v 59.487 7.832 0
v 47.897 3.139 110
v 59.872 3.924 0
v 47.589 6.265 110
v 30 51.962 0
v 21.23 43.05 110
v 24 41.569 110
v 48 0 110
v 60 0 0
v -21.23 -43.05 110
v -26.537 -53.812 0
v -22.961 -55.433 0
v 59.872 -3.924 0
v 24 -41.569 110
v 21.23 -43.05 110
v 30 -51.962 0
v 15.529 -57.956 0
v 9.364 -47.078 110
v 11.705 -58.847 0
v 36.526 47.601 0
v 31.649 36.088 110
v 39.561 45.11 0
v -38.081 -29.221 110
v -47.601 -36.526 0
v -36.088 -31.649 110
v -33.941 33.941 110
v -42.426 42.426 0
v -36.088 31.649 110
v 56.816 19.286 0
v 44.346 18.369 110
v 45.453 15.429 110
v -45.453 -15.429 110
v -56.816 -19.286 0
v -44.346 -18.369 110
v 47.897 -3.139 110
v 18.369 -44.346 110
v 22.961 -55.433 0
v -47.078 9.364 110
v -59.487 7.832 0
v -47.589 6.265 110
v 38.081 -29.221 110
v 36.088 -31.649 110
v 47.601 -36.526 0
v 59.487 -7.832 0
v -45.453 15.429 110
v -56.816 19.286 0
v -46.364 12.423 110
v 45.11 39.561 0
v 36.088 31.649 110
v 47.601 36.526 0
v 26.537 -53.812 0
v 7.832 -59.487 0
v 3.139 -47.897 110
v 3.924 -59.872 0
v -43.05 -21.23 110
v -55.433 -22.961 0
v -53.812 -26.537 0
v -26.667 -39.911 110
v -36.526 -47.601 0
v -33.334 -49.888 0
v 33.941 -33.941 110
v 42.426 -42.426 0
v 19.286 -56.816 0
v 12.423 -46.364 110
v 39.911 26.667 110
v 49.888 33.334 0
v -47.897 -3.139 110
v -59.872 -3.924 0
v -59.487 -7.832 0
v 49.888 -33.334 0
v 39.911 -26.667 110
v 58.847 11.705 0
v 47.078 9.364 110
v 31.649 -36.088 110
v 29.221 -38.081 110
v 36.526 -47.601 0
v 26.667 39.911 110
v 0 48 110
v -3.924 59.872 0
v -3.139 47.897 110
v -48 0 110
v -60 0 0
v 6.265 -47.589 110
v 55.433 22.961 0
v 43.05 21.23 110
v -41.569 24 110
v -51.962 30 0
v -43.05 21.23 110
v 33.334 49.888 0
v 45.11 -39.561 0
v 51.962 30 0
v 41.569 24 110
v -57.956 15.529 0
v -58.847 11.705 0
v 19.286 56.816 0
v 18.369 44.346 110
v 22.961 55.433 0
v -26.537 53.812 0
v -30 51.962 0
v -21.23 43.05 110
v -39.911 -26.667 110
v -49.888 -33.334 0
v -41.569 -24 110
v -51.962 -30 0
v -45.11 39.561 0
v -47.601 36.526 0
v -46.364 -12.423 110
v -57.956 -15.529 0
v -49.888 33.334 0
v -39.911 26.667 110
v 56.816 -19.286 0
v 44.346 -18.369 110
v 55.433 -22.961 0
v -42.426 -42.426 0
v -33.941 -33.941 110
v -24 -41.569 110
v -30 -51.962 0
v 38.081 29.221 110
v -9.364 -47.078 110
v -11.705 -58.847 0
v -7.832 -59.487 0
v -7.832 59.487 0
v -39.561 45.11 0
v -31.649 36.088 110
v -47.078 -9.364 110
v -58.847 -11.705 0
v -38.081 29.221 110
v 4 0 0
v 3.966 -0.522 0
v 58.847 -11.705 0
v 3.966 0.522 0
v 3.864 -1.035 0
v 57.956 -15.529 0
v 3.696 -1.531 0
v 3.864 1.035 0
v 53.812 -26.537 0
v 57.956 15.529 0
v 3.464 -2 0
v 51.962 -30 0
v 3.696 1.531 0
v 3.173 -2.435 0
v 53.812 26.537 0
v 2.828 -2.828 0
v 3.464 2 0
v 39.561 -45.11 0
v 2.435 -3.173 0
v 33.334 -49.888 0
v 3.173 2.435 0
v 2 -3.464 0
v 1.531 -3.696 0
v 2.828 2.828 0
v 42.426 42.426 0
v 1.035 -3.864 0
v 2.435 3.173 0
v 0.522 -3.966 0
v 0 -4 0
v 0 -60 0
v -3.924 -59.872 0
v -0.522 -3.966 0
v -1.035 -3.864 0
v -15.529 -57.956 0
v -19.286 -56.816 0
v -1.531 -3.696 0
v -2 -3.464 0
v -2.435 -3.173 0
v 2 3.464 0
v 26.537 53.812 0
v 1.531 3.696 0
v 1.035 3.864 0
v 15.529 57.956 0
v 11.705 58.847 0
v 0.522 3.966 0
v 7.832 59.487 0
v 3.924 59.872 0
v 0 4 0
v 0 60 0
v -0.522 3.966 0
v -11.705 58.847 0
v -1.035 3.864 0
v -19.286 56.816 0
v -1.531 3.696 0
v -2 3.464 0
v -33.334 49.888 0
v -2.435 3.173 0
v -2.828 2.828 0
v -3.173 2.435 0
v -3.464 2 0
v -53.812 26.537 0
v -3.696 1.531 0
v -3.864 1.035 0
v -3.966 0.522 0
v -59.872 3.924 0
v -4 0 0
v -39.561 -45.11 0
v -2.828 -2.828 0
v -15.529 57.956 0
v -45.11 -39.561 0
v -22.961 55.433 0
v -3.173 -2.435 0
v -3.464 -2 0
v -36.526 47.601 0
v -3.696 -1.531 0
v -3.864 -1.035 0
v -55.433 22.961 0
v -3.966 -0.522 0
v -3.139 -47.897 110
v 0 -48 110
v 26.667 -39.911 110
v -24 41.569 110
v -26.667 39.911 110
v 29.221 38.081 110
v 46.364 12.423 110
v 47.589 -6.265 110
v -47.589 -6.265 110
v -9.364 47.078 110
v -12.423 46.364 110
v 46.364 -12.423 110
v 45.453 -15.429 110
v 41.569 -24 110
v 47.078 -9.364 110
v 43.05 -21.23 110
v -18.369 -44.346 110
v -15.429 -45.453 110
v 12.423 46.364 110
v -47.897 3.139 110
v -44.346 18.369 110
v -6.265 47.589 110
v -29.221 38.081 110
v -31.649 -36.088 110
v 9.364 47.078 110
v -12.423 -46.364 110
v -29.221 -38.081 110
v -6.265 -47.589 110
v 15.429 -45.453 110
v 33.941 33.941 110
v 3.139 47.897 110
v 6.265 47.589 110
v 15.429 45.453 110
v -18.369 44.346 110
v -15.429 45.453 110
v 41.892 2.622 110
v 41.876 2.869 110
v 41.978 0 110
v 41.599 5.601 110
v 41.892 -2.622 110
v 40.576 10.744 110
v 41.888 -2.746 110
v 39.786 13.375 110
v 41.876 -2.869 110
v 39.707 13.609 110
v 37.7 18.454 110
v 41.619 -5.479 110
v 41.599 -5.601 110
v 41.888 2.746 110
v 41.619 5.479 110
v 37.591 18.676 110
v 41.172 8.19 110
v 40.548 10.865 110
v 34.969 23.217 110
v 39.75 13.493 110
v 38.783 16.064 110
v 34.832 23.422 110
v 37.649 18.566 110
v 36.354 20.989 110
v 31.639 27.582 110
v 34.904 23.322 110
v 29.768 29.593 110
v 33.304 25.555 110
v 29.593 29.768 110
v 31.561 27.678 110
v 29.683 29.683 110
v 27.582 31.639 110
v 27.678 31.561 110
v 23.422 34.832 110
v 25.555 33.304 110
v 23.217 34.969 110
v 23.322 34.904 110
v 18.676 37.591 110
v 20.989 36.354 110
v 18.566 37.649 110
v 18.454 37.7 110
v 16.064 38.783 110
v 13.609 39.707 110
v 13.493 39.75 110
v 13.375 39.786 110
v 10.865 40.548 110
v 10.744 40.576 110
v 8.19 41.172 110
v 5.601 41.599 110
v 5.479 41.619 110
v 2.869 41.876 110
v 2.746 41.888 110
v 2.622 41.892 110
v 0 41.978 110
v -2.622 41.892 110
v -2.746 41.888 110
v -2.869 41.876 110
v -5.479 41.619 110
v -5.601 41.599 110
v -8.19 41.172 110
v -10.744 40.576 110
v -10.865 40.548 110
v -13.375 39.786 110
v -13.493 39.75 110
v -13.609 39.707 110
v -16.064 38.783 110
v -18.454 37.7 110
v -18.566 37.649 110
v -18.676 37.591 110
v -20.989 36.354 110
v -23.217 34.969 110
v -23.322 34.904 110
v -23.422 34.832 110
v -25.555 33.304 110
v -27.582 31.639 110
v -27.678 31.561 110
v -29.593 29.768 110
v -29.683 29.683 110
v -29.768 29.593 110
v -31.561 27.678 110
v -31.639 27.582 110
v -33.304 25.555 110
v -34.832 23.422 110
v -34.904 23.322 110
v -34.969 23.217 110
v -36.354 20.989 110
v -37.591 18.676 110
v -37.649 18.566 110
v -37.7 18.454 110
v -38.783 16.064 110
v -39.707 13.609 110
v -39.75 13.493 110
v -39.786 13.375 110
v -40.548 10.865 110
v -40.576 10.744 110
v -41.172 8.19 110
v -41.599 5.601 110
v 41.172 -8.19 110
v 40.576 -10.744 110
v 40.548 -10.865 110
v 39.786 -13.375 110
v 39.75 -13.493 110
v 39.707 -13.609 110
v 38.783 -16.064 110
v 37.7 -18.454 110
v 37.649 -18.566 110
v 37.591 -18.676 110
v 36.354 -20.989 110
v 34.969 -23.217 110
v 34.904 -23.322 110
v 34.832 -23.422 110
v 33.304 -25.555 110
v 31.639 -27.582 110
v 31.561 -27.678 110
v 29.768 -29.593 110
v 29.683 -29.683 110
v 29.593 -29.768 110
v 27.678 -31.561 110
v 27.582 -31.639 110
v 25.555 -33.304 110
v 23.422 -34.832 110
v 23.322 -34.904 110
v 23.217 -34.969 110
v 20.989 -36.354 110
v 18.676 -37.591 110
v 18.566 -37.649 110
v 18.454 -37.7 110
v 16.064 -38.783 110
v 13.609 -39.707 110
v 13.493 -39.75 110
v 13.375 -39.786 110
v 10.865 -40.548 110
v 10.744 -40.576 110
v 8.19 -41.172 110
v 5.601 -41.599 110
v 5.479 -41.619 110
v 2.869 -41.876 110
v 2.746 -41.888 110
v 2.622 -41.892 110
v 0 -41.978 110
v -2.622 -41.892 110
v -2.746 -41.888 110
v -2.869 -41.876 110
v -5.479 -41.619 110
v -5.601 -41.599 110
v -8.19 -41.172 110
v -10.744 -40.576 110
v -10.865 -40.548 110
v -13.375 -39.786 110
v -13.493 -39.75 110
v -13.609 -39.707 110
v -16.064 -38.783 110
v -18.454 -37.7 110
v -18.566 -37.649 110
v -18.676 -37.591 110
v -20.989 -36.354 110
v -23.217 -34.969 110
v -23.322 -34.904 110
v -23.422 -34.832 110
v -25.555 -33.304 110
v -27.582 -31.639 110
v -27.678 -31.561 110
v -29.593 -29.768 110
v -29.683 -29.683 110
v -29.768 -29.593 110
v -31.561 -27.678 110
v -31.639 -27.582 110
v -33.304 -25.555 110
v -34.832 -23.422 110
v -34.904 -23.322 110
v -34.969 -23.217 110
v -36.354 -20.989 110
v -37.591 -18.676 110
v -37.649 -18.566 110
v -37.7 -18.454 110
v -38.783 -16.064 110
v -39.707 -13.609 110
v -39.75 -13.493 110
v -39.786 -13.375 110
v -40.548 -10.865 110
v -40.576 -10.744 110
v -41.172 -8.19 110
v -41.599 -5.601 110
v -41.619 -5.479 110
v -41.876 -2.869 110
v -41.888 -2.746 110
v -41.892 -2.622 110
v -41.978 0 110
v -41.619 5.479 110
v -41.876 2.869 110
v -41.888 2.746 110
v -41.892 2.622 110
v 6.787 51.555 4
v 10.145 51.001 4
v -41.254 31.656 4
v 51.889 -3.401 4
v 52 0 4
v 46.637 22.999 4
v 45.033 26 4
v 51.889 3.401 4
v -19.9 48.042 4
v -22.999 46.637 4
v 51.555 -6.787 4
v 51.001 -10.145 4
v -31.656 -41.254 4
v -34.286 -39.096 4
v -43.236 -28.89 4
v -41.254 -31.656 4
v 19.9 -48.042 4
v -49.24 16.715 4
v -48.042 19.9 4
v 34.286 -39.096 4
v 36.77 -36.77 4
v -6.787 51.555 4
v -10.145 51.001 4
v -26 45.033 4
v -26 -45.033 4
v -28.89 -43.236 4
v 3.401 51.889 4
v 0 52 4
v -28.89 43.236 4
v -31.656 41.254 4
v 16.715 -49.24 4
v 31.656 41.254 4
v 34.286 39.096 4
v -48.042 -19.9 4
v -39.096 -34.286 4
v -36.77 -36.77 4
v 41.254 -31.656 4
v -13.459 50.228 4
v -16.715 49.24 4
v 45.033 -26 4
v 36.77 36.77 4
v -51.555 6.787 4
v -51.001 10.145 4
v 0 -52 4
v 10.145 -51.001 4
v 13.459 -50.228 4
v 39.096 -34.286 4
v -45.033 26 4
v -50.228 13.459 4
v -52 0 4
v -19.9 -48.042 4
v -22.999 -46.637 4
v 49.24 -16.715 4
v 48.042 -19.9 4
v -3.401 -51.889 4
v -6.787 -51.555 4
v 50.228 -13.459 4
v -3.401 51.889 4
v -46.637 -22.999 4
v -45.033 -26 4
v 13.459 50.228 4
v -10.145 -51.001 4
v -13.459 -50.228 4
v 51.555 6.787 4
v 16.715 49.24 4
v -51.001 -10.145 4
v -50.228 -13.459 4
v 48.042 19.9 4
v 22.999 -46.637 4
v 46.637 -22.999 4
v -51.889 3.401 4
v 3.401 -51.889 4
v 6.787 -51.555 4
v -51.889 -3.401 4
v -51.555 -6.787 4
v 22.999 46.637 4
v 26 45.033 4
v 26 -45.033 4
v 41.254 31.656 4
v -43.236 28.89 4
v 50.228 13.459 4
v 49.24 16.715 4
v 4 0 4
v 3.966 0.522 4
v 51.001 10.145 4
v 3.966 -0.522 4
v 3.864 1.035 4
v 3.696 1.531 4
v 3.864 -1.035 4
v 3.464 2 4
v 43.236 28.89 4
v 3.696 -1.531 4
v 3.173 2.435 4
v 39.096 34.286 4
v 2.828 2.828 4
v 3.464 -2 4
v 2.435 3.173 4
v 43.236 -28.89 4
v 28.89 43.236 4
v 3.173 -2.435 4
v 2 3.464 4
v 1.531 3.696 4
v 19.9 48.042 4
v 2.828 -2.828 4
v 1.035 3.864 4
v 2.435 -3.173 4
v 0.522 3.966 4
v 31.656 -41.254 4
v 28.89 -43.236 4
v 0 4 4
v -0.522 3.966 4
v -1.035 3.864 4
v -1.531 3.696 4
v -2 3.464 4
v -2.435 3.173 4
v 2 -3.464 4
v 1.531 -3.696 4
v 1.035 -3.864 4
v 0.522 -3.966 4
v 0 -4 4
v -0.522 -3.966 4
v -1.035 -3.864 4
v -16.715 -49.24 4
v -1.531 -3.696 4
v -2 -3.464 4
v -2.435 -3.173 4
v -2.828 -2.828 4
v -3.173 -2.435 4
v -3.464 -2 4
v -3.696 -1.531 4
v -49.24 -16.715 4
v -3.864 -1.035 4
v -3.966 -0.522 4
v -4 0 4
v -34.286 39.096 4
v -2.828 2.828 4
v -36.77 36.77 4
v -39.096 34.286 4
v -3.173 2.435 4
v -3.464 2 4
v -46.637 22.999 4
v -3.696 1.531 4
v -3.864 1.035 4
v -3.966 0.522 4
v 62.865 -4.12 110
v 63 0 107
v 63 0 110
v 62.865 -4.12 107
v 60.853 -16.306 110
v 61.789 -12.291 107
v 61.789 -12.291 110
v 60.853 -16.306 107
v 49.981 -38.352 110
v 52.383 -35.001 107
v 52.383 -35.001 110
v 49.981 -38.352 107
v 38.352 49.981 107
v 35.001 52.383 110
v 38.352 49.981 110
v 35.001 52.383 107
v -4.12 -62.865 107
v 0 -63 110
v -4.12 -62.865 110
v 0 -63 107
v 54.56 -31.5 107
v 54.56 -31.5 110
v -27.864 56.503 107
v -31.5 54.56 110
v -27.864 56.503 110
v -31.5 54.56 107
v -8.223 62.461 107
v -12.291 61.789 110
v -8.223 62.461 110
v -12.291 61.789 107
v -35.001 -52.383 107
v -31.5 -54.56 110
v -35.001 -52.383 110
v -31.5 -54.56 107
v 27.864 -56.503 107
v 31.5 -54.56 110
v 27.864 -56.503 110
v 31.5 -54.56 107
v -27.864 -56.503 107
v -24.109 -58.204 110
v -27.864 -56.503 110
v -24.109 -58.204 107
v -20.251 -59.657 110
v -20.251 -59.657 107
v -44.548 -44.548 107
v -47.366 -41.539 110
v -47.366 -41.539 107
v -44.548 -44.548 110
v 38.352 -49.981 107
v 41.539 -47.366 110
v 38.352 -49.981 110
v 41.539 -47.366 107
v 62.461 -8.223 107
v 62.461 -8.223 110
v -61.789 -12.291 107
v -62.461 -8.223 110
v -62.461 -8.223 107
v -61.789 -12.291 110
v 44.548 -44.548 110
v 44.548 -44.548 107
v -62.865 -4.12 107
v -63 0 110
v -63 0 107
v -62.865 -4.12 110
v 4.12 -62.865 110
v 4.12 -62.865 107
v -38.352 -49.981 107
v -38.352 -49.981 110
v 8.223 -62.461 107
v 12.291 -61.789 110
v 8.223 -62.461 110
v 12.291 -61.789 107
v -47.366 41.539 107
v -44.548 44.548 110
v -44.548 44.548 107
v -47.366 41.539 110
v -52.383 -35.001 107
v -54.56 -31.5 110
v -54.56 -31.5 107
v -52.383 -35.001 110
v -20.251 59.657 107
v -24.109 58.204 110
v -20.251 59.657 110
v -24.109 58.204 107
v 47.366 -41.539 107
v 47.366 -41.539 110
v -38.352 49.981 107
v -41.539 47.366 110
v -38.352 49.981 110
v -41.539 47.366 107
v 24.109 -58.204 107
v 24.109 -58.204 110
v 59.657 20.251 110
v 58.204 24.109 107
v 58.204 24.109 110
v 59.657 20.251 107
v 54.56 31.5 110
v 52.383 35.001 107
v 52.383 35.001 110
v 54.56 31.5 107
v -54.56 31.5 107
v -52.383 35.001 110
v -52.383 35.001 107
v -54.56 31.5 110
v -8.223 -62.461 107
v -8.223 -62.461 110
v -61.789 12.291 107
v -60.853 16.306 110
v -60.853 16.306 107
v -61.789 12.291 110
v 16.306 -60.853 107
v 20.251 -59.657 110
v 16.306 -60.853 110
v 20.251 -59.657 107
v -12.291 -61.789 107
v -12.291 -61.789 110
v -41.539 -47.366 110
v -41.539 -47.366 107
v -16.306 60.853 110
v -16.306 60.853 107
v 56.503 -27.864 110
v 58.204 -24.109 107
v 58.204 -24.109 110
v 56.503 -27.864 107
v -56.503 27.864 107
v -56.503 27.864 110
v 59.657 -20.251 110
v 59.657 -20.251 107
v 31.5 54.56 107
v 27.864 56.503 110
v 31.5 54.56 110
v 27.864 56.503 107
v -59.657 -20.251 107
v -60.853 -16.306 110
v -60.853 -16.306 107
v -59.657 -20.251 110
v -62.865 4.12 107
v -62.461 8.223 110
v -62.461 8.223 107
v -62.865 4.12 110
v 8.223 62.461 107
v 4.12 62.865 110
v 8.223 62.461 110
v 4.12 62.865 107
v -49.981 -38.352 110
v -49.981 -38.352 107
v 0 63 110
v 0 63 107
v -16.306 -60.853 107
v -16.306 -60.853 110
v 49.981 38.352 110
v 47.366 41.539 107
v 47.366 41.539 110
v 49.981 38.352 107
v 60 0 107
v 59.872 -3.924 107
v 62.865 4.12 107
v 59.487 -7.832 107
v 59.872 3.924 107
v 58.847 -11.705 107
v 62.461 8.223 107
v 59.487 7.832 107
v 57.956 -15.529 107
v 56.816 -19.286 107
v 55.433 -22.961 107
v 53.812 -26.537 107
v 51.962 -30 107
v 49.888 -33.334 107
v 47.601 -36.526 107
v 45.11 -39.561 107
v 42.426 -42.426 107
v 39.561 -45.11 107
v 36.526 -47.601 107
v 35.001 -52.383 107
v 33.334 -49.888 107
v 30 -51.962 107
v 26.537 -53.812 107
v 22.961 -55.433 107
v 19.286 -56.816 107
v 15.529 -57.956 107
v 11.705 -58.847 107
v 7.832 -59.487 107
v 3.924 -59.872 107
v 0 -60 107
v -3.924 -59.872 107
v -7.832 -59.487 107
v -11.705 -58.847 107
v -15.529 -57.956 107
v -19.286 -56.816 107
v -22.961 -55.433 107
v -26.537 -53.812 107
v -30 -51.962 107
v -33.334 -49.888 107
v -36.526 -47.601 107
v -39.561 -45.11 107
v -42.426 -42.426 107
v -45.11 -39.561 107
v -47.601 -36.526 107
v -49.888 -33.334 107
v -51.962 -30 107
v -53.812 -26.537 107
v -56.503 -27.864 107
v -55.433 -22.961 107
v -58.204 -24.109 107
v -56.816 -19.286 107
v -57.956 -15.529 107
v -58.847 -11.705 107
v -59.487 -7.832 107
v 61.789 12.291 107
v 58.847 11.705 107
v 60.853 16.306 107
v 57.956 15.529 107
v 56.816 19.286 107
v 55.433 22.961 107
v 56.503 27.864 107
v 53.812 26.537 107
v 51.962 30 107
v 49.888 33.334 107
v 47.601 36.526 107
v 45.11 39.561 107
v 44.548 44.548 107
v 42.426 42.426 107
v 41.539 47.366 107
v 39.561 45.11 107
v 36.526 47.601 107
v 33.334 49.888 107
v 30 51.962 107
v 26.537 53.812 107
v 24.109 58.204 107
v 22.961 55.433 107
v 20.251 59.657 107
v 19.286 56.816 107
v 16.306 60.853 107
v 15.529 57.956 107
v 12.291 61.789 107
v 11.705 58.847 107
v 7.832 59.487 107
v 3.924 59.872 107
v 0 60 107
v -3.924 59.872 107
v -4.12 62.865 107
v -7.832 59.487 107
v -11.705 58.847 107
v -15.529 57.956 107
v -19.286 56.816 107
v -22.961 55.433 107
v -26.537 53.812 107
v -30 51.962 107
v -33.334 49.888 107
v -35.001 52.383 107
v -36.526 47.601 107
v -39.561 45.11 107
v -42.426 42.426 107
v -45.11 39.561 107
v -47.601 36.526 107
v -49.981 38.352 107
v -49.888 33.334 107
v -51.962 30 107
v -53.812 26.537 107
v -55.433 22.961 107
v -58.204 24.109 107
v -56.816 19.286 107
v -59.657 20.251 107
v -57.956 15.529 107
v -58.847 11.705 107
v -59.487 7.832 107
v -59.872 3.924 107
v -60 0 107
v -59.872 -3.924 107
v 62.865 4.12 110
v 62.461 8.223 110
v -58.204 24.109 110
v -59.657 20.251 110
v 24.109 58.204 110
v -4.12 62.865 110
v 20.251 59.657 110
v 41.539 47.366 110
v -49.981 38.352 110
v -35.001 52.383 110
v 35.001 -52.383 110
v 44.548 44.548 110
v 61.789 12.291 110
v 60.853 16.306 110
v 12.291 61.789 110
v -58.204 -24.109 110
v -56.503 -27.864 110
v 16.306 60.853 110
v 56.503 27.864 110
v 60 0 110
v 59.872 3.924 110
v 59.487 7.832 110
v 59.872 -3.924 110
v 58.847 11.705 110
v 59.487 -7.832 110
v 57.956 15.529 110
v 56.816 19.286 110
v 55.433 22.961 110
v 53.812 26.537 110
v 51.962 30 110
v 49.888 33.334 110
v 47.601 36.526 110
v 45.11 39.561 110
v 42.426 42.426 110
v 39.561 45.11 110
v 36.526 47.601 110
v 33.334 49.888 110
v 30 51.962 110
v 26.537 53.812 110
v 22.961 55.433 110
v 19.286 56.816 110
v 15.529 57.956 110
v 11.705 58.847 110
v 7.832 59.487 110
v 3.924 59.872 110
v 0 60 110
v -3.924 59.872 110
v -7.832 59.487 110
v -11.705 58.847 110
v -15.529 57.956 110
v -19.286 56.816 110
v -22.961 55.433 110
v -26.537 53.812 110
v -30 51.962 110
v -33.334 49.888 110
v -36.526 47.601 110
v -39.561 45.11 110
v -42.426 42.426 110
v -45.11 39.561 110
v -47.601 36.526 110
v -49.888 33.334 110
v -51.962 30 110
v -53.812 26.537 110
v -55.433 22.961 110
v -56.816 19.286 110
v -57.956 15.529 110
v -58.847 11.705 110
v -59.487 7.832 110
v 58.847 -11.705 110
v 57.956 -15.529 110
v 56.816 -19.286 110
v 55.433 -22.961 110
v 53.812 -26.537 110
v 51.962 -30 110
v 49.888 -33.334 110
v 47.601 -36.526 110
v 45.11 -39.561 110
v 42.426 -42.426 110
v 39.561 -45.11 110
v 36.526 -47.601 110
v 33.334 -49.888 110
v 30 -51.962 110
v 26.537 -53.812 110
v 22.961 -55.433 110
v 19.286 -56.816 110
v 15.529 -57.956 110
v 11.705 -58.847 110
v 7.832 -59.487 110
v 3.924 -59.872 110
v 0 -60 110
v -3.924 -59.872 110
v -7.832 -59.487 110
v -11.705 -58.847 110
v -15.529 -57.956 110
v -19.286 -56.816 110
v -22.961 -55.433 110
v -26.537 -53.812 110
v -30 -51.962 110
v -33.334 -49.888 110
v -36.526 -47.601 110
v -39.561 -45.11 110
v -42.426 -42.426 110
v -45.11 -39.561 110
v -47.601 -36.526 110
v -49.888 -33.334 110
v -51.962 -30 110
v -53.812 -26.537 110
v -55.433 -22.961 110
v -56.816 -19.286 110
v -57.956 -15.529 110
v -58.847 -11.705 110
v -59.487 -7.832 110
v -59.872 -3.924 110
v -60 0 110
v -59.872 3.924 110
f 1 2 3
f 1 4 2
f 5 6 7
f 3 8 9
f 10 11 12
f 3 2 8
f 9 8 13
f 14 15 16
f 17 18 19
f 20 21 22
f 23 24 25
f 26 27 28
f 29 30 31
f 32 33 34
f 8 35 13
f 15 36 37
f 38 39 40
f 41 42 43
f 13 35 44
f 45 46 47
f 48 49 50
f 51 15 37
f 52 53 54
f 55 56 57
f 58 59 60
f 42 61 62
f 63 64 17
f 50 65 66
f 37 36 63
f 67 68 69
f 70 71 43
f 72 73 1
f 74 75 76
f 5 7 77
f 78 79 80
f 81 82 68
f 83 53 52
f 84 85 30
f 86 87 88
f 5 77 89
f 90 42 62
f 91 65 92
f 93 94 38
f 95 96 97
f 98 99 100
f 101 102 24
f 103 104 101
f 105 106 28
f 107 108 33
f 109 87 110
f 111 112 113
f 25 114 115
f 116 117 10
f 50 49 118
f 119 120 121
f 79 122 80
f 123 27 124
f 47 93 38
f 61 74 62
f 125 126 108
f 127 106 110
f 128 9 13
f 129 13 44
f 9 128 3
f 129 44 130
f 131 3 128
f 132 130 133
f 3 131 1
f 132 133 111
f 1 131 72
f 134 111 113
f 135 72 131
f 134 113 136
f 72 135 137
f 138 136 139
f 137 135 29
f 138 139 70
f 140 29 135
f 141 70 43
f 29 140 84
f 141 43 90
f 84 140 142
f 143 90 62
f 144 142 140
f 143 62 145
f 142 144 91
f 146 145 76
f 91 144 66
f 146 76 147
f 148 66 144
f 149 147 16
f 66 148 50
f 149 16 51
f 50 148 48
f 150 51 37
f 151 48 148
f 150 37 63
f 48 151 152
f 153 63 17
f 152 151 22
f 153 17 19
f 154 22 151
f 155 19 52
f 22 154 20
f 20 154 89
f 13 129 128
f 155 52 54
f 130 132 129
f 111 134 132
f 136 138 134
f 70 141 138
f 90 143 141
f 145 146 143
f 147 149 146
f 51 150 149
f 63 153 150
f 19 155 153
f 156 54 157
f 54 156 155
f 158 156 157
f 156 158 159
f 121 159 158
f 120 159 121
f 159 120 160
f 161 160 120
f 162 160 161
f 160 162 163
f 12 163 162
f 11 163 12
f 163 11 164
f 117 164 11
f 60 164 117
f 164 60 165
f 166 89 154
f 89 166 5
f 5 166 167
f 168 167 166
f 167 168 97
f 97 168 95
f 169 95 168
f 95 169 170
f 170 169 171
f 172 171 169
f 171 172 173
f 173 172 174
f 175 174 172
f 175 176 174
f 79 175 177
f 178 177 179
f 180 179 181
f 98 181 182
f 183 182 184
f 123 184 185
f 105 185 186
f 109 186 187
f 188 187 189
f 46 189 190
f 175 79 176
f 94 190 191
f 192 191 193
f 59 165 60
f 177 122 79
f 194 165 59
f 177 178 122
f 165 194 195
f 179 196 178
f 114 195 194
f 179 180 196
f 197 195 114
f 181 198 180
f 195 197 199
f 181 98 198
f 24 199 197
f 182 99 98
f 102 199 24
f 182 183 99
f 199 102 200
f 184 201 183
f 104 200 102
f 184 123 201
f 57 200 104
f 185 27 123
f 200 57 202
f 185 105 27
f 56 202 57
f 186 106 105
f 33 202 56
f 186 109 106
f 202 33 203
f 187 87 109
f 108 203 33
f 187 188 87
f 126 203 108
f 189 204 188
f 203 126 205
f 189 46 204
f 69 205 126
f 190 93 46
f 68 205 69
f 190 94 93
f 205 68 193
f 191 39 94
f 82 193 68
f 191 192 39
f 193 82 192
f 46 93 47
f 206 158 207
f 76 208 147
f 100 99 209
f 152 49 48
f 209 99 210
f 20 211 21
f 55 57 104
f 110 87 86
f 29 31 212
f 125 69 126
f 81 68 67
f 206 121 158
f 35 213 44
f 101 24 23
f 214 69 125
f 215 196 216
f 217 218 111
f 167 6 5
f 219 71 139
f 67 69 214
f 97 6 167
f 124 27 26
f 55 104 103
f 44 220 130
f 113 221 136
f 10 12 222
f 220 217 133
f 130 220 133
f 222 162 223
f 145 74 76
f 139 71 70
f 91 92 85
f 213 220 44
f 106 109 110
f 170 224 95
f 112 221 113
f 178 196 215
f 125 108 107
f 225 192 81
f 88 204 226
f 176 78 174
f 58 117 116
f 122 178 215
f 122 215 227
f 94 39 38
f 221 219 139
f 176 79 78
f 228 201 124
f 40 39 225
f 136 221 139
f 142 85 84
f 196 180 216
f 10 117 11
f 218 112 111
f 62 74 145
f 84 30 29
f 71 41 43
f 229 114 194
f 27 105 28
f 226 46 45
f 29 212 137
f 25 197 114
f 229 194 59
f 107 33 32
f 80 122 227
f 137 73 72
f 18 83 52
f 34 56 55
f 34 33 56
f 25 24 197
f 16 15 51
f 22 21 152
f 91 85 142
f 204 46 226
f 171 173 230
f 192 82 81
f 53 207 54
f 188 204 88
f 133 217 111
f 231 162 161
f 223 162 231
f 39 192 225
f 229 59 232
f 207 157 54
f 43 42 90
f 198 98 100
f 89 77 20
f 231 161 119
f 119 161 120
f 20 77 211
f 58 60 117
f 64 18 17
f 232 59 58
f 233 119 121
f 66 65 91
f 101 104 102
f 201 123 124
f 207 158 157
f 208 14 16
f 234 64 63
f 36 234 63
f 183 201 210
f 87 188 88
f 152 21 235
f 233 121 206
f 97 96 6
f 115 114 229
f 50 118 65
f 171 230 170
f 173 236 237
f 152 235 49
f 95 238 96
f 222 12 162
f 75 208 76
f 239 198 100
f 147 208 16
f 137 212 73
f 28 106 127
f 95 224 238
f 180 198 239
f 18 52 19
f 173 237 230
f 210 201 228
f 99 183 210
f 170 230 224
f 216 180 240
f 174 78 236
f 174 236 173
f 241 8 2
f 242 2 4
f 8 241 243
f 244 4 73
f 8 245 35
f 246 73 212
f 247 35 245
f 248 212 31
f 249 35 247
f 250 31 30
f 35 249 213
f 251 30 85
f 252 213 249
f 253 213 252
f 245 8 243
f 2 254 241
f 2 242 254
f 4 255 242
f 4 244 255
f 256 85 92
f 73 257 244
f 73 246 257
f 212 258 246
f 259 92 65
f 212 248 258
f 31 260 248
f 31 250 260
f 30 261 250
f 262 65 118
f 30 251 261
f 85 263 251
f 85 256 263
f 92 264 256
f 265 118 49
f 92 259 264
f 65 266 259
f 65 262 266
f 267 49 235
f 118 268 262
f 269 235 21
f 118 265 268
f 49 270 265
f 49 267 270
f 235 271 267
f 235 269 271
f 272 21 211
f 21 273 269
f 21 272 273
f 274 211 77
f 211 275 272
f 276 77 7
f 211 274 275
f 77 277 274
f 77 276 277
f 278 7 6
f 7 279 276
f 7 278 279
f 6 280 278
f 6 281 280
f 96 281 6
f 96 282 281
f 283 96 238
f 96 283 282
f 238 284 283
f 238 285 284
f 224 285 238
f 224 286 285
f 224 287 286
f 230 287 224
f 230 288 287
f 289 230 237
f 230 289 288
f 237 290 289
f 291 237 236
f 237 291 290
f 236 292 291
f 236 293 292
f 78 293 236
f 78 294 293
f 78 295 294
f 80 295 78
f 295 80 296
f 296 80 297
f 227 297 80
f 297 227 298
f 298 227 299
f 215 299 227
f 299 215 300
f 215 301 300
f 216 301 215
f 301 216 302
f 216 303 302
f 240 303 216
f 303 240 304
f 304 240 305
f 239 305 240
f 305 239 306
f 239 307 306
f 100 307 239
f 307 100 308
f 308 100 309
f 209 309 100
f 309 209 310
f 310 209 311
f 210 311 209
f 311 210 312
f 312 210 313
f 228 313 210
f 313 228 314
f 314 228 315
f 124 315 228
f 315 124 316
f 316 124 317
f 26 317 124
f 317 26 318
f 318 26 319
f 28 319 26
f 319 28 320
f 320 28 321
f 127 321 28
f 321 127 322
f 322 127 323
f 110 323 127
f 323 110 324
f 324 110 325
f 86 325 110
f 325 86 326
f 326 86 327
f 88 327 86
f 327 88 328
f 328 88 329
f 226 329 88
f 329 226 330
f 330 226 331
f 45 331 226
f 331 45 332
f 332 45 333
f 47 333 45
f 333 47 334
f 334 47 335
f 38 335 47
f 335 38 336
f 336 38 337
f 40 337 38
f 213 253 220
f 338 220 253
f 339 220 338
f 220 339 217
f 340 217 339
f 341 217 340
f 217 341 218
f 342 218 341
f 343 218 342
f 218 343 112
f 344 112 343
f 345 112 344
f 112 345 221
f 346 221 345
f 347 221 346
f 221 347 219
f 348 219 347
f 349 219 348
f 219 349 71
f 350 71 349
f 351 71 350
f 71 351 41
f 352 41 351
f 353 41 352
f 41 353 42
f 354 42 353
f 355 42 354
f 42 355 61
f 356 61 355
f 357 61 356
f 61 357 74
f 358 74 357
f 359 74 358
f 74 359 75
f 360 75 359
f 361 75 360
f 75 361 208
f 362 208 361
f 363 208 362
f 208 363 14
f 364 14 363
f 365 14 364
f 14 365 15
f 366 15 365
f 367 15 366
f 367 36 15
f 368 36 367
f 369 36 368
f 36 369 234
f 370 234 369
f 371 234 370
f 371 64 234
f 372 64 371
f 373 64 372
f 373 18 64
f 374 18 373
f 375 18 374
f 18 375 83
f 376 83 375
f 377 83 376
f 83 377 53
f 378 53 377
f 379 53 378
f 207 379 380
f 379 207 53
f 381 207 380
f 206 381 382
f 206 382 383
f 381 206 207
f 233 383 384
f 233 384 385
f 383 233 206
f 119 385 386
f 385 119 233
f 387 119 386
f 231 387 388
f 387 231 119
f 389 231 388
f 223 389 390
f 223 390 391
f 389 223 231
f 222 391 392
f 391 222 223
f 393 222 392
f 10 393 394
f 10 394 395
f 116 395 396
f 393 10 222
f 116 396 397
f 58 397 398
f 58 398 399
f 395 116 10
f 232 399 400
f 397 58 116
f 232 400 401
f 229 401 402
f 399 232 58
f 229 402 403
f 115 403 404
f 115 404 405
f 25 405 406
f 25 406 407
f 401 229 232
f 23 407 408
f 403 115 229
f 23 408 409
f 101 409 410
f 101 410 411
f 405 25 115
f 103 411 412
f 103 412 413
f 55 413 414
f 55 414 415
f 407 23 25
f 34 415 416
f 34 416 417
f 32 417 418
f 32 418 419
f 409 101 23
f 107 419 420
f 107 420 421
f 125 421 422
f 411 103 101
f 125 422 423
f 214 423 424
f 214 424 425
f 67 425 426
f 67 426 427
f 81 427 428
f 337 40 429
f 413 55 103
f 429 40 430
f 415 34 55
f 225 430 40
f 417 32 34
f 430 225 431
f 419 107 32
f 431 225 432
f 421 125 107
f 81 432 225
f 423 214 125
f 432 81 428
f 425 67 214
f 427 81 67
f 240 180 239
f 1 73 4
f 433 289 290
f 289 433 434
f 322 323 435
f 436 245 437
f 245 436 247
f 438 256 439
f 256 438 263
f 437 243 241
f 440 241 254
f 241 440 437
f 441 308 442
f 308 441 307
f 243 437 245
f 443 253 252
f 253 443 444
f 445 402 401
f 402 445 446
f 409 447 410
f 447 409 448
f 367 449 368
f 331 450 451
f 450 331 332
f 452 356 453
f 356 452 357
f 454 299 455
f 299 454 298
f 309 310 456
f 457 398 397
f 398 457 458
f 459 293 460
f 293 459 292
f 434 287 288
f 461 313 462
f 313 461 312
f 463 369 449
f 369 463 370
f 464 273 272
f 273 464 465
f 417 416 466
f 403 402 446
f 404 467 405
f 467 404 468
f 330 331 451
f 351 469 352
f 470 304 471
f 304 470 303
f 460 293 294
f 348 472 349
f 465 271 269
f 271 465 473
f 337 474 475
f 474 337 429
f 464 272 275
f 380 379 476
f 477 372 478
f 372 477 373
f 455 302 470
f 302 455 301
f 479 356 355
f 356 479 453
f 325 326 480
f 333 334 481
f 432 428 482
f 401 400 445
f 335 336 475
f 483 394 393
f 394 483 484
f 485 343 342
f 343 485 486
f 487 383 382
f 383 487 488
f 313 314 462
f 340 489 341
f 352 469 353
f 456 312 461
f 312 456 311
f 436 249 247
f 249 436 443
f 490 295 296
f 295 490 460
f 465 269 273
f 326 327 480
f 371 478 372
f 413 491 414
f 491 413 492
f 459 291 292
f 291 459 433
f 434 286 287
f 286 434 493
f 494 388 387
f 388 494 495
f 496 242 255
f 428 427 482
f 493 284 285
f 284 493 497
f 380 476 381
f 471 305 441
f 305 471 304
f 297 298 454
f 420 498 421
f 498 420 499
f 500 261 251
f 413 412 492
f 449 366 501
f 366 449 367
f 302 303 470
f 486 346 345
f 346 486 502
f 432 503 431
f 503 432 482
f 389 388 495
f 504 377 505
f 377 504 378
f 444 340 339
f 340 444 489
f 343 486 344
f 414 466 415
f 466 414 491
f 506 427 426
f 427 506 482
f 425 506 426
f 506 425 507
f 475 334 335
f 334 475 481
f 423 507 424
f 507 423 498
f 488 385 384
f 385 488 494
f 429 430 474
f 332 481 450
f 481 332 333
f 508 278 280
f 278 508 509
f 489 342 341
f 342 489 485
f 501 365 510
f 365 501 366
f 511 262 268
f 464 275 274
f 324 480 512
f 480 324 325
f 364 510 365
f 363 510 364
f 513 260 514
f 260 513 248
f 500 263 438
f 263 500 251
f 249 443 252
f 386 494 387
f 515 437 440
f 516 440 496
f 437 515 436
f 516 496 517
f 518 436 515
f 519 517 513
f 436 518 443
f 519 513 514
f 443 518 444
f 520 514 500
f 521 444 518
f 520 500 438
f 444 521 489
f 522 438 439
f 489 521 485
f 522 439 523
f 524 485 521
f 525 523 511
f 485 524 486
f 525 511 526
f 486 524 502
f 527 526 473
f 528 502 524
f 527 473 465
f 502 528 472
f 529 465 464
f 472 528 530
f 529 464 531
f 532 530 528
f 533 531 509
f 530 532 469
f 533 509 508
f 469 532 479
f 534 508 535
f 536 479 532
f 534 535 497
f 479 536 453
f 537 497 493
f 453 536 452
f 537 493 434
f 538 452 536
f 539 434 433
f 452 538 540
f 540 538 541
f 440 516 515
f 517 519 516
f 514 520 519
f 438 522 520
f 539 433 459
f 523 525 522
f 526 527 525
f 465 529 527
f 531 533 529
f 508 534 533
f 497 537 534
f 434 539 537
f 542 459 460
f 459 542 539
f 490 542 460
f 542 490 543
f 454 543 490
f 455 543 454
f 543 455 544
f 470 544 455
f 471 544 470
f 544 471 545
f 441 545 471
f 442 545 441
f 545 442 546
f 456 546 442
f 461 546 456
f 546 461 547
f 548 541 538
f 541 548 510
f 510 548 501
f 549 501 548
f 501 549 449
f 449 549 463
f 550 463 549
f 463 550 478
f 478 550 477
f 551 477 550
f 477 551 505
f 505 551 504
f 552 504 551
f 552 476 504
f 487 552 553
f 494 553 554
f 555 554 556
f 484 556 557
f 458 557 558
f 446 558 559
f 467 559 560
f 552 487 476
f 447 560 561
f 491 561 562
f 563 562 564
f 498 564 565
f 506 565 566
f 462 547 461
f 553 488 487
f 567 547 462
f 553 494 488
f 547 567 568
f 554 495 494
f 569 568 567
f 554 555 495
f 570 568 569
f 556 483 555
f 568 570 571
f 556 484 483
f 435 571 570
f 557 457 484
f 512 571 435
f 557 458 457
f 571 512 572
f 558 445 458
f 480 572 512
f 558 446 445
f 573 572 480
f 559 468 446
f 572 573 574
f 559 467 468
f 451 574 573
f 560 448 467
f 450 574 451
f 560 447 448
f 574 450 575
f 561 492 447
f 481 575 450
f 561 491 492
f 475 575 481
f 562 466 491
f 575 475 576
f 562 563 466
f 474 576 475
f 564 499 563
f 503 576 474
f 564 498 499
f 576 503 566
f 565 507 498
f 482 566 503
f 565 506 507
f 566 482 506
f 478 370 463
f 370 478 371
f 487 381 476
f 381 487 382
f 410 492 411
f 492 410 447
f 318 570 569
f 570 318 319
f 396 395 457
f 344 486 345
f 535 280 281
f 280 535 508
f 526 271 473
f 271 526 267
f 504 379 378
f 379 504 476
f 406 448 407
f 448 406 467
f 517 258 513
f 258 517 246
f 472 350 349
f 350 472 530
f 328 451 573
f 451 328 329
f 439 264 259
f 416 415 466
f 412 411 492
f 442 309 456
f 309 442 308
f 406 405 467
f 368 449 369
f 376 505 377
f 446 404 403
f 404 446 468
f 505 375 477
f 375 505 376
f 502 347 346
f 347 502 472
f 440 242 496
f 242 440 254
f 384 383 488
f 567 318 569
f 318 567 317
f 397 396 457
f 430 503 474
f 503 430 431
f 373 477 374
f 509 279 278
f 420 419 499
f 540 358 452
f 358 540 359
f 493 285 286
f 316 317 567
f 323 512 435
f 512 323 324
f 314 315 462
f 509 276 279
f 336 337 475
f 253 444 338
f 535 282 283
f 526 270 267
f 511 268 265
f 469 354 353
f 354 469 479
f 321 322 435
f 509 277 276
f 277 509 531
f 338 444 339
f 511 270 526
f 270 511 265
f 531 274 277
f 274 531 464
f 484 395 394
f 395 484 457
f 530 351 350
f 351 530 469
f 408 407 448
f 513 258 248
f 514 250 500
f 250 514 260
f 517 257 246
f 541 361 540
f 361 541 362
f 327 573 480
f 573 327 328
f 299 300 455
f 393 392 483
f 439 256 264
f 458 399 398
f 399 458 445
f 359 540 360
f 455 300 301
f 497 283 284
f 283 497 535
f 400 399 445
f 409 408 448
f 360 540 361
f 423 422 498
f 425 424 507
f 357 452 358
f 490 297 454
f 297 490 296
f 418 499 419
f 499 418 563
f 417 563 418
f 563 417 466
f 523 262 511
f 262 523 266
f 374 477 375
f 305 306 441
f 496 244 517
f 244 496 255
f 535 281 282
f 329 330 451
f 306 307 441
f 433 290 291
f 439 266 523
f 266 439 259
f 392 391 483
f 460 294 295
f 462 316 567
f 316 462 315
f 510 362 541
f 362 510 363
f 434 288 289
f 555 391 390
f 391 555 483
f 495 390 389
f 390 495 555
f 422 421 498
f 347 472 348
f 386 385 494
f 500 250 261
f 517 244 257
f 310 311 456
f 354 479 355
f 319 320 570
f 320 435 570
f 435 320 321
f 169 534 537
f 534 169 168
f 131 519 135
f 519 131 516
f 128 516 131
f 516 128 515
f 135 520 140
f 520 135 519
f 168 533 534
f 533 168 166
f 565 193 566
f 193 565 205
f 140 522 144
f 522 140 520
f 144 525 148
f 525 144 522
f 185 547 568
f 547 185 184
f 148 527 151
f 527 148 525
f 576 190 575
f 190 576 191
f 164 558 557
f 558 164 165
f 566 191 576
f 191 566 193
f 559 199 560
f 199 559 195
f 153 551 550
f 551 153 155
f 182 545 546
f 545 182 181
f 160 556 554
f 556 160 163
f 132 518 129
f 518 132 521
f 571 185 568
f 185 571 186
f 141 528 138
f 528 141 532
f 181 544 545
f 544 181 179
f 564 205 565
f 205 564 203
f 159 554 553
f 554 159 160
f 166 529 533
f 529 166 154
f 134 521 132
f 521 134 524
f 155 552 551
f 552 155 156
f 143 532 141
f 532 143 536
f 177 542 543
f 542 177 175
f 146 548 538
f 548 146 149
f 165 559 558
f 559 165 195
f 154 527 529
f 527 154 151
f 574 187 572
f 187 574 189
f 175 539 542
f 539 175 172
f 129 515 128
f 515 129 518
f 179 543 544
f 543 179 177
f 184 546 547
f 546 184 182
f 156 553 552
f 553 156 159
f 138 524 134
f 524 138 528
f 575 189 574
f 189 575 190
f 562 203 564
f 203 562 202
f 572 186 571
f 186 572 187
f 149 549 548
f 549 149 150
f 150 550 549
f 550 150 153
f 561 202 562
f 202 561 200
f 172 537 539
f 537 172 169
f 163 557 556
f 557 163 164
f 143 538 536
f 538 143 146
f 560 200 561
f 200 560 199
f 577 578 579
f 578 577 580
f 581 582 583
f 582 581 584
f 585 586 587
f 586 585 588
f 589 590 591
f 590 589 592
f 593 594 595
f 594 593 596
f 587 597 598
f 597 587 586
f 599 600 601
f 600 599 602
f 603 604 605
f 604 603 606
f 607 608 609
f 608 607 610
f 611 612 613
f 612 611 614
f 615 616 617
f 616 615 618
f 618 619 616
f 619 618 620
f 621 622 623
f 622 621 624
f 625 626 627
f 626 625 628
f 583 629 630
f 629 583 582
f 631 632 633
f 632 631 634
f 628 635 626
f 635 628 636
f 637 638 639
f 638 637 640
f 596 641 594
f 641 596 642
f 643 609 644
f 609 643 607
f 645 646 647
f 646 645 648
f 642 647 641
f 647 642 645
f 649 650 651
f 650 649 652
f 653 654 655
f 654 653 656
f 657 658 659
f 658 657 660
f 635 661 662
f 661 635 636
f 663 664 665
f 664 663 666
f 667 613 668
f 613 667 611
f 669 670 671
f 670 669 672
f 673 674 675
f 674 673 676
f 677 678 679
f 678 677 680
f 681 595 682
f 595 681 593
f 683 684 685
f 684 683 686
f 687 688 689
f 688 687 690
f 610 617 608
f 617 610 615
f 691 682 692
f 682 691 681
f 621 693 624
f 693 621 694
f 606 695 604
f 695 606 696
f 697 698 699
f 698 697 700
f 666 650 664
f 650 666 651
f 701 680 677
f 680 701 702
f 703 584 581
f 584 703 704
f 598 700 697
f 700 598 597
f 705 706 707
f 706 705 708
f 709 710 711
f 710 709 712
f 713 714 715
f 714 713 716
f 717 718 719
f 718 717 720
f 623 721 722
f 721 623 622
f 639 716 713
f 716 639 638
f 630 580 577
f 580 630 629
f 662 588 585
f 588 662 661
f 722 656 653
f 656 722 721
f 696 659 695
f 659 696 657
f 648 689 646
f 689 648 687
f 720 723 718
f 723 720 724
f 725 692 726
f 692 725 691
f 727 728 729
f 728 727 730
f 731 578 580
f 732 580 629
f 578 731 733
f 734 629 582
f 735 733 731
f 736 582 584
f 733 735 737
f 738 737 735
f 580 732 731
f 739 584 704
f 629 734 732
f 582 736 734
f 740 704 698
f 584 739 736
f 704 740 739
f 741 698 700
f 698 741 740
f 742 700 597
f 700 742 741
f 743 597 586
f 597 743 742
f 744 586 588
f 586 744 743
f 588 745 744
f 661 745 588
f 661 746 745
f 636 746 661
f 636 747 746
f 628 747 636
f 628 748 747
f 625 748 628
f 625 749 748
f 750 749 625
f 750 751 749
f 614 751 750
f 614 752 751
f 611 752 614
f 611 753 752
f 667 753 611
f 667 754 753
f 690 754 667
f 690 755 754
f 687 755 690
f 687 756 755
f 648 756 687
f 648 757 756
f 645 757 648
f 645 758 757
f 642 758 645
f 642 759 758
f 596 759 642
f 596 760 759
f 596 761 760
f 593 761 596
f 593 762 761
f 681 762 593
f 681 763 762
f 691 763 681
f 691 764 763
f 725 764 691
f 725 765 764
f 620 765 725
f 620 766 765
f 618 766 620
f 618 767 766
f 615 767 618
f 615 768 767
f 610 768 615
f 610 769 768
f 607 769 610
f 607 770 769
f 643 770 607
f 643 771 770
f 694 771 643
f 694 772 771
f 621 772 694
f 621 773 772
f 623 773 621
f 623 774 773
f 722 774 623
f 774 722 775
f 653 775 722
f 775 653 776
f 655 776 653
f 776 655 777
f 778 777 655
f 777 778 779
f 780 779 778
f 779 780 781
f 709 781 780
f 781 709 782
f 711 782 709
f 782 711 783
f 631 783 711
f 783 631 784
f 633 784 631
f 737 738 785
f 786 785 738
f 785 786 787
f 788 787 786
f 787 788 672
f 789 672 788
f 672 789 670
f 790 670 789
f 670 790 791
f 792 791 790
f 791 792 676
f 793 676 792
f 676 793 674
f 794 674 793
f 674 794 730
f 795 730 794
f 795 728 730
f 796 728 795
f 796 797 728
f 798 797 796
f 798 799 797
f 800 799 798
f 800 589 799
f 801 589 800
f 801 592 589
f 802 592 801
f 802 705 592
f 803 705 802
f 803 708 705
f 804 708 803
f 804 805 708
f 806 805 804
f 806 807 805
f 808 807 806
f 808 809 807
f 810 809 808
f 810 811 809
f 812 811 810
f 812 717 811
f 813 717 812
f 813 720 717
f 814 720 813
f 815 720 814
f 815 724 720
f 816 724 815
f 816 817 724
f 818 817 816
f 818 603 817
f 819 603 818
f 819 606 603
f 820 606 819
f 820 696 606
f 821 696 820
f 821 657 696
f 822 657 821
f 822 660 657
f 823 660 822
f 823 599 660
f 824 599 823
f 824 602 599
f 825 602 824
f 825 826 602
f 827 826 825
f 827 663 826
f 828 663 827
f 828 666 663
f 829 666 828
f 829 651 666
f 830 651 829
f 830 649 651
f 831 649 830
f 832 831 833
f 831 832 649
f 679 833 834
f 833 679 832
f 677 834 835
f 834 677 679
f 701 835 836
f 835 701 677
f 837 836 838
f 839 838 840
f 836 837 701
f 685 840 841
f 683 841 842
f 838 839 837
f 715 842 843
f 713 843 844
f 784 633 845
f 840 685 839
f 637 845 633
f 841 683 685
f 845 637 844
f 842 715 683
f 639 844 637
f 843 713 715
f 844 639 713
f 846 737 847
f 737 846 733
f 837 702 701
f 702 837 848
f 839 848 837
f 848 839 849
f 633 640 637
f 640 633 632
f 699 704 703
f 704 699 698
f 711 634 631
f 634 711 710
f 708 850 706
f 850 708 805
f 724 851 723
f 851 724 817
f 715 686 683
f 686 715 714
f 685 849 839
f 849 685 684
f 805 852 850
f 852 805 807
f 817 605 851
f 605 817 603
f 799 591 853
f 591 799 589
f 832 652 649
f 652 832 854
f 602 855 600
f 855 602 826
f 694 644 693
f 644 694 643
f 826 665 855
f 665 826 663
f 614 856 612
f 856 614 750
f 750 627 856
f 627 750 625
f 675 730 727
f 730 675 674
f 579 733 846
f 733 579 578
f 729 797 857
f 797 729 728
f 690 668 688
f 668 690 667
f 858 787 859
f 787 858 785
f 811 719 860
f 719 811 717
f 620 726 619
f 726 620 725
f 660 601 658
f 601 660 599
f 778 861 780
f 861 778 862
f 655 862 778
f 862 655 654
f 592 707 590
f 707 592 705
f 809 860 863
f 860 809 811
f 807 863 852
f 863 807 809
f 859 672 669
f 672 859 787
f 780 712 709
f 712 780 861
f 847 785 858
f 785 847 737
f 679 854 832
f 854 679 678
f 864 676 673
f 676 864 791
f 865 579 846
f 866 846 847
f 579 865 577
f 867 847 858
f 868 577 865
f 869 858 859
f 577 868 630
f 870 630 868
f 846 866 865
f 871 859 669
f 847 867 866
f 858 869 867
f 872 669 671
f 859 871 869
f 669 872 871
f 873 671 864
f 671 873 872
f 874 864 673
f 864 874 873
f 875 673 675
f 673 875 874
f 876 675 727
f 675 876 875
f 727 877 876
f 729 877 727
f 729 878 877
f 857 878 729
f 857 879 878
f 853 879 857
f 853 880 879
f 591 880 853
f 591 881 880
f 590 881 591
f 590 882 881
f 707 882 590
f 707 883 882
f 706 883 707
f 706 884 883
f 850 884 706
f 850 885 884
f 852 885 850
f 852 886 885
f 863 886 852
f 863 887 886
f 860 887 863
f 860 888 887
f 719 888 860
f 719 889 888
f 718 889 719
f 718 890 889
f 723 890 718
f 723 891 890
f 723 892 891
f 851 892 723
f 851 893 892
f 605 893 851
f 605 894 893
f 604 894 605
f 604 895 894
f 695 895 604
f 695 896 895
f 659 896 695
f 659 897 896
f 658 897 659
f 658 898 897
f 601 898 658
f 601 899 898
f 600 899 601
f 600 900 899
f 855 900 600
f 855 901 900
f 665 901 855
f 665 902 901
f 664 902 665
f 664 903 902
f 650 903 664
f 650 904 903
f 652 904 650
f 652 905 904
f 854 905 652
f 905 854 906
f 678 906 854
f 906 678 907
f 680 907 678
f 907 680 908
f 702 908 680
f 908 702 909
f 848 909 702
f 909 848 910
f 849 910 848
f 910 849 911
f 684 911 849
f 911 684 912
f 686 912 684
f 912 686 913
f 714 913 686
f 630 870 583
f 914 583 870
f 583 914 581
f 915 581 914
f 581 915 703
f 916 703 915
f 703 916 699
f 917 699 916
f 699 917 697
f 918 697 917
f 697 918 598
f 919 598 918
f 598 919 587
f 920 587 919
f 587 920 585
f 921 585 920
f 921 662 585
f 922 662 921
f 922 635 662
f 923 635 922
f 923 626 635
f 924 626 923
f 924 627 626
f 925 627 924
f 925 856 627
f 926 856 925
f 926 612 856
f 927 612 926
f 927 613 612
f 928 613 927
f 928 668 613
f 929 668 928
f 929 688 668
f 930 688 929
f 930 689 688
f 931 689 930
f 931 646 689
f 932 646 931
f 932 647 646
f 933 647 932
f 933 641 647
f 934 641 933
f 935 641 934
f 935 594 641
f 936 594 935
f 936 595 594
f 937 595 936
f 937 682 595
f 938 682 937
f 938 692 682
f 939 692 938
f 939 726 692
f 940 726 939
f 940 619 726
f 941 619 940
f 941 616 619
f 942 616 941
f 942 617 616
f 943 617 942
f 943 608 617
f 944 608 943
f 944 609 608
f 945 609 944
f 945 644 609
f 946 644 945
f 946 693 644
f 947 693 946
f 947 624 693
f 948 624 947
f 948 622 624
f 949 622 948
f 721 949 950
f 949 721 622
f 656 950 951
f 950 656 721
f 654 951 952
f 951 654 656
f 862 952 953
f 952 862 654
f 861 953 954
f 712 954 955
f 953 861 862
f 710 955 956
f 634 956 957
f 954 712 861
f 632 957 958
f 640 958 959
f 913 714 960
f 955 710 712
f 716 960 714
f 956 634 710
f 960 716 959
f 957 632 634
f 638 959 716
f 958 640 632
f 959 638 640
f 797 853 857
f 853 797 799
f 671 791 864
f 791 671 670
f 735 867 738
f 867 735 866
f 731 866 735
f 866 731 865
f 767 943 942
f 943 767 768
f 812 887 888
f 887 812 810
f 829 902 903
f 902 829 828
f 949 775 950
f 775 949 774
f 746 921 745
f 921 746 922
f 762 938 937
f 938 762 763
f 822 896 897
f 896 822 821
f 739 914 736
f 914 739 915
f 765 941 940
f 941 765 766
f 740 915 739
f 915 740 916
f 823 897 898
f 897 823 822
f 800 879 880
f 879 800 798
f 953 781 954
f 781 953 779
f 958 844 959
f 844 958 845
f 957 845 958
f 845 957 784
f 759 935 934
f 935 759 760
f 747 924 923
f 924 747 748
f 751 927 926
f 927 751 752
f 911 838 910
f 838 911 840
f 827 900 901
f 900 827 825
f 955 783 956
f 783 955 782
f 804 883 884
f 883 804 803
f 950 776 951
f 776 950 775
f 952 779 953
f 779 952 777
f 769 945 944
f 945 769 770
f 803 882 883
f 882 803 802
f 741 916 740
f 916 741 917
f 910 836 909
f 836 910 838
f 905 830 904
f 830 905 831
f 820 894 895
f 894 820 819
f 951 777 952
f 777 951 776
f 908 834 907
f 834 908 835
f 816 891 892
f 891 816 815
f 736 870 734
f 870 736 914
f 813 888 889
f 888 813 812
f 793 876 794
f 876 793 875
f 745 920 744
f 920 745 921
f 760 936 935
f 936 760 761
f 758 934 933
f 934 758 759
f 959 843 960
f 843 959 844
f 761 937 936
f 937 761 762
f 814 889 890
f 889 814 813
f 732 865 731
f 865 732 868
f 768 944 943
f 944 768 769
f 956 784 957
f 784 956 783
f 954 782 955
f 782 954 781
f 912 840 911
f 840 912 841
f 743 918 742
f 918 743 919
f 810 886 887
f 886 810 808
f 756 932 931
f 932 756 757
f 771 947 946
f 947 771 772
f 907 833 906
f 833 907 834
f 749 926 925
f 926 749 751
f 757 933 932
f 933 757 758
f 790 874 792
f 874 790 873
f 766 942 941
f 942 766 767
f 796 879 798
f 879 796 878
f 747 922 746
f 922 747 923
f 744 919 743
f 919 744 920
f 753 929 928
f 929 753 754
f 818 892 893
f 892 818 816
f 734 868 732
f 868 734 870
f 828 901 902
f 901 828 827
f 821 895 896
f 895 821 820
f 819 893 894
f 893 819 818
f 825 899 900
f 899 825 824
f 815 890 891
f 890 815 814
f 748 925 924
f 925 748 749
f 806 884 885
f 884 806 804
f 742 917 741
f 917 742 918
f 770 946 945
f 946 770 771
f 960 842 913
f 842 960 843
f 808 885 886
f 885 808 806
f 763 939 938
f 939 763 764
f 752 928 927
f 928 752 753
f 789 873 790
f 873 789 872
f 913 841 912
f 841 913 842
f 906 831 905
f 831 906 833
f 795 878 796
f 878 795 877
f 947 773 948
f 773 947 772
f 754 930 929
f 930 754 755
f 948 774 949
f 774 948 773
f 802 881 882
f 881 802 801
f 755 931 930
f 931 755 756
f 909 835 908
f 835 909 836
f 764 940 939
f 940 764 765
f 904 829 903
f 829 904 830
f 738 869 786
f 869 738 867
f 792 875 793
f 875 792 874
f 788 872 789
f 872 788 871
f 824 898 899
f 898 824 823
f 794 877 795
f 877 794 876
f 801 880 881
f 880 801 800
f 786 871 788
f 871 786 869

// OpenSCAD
outer_diameter = 120;
inner_diameter = 104;
height = 110;
base_thickness = 4;
drain_hole_diameter = 8;
rim_thickness = 3;

module main() {
    difference() {
        linear_extrude(height = height, scale = 0.8, center = false)
            circle(d = outer_diameter, $fn = 96);
        translate([0, 0, base_thickness])
            linear_extrude(height = height, scale = 0.8, center = false)
                circle(d = inner_diameter, $fn = 96);
        cylinder(d = drain_hole_diameter, h = base_thickness + 2, center = false, $fn = 48);
    }
    translate([0, 0, height - rim_thickness])
        difference() {
            linear_extrude(height = rim_thickness, center = false)
                circle(d = outer_diameter + rim_thickness * 2, $fn = 96);
            linear_extrude(height = rim_thickness, center = false)
                circle(d = outer_diameter, $fn = 96);
        }
}

main();
